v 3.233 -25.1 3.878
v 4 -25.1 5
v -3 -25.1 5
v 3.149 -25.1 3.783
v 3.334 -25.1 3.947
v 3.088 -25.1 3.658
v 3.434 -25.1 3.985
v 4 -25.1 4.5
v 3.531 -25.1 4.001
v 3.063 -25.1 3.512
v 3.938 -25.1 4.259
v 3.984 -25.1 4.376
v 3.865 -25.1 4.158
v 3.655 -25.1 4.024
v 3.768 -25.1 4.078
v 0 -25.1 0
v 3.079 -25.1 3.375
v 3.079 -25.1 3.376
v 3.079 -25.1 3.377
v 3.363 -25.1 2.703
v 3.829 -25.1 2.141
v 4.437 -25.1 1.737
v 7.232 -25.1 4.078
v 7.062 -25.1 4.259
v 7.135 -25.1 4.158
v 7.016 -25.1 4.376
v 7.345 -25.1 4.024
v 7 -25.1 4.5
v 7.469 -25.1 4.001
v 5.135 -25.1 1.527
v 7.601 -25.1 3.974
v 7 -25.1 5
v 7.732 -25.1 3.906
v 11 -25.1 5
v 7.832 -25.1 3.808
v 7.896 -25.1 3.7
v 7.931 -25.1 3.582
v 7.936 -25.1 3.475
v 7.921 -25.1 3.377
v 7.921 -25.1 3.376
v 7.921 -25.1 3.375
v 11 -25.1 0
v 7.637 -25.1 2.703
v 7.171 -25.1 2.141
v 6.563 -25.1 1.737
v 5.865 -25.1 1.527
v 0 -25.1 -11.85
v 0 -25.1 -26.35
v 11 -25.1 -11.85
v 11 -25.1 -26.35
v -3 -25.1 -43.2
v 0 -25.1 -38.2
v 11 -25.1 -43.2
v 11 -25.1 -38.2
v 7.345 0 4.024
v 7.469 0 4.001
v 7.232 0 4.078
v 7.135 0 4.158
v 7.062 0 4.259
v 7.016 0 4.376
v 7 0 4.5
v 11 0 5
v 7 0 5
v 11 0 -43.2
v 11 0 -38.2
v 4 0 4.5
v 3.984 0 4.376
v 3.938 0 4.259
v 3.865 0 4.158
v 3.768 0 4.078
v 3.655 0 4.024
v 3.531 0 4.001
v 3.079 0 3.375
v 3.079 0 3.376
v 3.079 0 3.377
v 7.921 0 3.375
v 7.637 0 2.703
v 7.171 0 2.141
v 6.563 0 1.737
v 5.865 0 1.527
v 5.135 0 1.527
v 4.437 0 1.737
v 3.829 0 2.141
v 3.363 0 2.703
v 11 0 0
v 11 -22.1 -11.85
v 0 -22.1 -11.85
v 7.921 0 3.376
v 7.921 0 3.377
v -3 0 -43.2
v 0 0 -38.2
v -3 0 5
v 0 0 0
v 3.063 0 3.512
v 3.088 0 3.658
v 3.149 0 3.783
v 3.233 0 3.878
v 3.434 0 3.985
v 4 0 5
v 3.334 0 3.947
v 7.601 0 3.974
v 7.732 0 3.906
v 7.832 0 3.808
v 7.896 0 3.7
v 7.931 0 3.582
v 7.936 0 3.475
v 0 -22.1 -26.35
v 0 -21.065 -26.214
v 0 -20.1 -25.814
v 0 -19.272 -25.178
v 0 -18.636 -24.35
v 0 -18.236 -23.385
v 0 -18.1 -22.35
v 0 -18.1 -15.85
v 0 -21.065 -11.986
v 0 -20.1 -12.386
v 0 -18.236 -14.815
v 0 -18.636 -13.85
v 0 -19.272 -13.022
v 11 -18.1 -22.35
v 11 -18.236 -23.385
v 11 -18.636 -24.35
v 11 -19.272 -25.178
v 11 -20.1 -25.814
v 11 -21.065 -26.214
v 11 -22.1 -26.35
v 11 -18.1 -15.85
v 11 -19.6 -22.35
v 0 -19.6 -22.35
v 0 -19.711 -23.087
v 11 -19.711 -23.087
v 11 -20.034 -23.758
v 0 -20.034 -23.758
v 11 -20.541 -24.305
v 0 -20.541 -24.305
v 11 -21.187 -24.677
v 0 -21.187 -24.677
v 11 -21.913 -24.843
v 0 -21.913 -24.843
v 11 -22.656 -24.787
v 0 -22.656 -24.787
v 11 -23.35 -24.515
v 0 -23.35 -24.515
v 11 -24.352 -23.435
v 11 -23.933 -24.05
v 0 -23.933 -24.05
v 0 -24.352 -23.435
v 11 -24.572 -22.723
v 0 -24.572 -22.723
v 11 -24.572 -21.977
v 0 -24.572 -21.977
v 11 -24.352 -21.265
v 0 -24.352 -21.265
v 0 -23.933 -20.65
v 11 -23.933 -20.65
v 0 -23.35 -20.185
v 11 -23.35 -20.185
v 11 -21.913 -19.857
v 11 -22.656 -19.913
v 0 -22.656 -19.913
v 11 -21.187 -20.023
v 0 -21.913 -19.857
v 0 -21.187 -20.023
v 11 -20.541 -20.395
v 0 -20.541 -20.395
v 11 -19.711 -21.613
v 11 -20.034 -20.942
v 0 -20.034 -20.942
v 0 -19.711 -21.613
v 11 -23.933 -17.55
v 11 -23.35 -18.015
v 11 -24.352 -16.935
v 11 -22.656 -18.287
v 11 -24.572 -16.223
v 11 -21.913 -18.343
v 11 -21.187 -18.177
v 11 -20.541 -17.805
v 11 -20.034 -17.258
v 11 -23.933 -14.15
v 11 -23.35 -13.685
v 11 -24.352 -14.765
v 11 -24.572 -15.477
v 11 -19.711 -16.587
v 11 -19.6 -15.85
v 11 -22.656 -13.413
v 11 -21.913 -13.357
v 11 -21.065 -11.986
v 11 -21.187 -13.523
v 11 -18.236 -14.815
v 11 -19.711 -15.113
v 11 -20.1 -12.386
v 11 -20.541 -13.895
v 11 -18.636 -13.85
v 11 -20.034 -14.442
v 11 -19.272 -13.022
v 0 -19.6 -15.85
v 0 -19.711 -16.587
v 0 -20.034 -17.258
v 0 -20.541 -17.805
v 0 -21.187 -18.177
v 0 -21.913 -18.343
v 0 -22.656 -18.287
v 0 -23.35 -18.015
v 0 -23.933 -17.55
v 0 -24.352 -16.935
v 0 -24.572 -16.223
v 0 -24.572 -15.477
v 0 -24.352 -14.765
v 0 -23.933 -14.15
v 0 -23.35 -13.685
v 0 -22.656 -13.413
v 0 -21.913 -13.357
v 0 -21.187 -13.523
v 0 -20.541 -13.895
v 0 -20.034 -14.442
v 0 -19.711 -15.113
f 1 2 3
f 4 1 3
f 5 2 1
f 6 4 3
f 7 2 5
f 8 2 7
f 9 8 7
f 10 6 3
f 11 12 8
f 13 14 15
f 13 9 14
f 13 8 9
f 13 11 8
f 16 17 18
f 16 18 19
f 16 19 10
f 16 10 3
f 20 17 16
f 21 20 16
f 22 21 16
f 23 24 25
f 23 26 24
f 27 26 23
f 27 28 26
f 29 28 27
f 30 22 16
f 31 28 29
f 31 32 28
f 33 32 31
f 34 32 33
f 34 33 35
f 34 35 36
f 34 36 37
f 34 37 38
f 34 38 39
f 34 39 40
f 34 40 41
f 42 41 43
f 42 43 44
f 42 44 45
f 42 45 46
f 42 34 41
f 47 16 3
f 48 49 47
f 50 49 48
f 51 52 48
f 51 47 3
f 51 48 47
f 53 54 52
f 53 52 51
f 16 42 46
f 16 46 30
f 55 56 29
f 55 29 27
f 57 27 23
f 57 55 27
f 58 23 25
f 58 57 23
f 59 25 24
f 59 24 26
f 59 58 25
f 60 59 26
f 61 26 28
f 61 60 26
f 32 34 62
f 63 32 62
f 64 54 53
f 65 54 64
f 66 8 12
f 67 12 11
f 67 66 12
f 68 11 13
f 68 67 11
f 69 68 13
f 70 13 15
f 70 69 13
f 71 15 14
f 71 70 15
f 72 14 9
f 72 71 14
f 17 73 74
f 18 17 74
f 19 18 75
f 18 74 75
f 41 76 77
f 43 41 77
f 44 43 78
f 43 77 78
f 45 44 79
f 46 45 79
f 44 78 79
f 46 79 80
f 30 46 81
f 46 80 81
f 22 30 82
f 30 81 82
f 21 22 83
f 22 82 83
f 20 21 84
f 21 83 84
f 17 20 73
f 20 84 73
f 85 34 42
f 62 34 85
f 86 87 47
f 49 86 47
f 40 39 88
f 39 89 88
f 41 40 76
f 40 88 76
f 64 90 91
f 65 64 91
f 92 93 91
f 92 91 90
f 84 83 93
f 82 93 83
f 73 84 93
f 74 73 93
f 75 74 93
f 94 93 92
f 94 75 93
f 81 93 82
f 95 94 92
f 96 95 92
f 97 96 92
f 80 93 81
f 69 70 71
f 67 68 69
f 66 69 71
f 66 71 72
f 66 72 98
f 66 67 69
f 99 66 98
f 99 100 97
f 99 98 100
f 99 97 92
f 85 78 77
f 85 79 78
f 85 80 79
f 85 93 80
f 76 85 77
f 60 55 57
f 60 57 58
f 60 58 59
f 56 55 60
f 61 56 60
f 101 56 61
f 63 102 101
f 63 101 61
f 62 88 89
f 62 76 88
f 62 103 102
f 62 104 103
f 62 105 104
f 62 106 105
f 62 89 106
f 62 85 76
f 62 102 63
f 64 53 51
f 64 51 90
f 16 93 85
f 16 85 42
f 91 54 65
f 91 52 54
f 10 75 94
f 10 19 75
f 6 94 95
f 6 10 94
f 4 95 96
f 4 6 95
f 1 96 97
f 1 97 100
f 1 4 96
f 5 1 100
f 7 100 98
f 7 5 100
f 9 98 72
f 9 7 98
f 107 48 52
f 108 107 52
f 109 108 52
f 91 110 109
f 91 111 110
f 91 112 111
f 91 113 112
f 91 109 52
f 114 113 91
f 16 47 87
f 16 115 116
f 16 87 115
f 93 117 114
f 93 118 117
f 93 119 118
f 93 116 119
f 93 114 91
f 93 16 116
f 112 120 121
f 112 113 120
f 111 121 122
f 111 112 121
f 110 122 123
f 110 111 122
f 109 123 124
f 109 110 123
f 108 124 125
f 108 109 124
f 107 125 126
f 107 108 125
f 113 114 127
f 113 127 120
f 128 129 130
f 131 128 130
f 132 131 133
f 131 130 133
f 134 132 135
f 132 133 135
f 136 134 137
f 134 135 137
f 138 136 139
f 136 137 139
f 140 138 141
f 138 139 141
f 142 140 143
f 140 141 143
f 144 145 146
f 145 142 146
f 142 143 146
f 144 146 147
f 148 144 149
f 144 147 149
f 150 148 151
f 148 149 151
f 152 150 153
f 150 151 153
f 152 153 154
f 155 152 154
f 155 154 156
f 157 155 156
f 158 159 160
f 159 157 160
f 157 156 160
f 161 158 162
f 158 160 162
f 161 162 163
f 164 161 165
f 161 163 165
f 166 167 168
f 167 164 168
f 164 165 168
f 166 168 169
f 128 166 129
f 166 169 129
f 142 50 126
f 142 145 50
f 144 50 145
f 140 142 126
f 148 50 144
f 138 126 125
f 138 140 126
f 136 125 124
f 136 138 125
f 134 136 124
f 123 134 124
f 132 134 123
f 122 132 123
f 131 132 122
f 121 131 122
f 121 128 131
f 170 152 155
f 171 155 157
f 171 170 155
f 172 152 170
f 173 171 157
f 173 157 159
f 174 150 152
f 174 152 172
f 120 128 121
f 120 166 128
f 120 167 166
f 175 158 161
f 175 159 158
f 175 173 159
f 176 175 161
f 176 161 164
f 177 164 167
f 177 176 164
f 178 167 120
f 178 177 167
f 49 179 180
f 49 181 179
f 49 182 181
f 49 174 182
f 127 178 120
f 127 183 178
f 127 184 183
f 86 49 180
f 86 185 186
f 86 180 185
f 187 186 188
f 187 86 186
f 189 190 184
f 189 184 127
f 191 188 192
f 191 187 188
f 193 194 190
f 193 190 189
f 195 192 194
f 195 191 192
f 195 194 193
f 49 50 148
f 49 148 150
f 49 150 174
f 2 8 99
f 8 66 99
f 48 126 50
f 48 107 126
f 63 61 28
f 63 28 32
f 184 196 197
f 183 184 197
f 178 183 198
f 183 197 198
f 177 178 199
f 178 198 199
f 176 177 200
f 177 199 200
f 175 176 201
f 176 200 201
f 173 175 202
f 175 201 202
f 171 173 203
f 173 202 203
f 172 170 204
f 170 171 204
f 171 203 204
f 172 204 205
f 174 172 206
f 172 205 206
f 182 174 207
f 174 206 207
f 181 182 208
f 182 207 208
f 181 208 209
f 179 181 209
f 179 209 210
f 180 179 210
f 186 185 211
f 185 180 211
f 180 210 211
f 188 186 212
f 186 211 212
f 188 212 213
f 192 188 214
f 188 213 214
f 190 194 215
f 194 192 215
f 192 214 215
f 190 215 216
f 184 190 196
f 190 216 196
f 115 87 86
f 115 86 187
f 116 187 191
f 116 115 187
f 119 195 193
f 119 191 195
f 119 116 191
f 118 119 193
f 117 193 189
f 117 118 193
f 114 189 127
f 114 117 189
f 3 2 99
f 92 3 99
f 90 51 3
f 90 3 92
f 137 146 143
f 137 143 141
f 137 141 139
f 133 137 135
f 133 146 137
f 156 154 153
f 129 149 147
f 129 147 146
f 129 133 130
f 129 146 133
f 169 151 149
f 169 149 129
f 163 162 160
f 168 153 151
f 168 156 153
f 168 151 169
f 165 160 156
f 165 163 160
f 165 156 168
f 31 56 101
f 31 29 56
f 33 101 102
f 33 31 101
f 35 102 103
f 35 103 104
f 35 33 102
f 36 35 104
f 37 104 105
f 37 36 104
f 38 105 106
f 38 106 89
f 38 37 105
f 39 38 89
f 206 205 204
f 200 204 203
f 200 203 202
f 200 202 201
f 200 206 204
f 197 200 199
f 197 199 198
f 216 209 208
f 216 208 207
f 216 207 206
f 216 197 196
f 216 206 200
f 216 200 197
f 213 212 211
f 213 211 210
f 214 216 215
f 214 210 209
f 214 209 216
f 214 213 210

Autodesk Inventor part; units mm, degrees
ref_plane "YZ Plane" through (0, 0, 0) normal (1, 0, 0) x (0, 1, 0)
ref_plane "XZ Plane" through (0, 0, 0) normal (0, 1, 0) x (-1, 0, 0)
sketch "Sketch1" plane through (0, 0, 0) normal (1, 0, 0) x (0, 1, 0)
  line L0 (0, 0) -> (-25.1, 0)
  line L1 (-25.1, 0) -> (-25.1, -38.2)
  line L2 (-25.1, -38.2) -> (0, -38.2)
  line L3 (0, -38.2) -> (0, 0)
  circle A0 centre (-22.1, -15.85) radius 2.5
  circle A1 centre (-22.1, -22.35) radius 2.5
  arc A2 (-18.1, -15.85) -> (-25.1, -18.4958) centre (-22.1, -15.85) ccw
  arc A3 (-25.1, -19.7042) -> (-18.1, -22.35) centre (-22.1, -22.35) ccw
  line L4 (-18.1, -15.85) -> (-18.1, -22.35)
  line L5 (-22.1, -11.85) -> (-25.1, -11.85)
  line L6 (-22.1, -26.35) -> (-25.1, -26.35)
  line L7 (0, 0) -> (-25.1, 0)
  line L8 (-25.1, 0) -> (-25.1, 5)
  line L9 (-25.1, 5) -> (0, 5)
  line L10 (0, 5) -> (0, 0)
  line L11 (0, -38.2) -> (-25.1, -38.2)
  line L12 (-25.1, -38.2) -> (-25.1, -43.2)
  line L13 (-25.1, -43.2) -> (0, -43.2)
  line L14 (0, -43.2) -> (0, -38.2)
  point P0 (-25.1, -19.1)
  point P1 (-25.1, -13.2042)
  point P2 (-25.1, -24.9958)
  dimension "d0" = 38.2
  dimension "d1" = 25.1
  dimension "d2" = 5
  dimension "d3" = 6.5
  dimension "d4" = 3
  dimension "d5" = 3.25
  dimension "d6" = 8
  dimension "d11" = 5
  dimension "d12" = 5
extrude "Extrusion1" add sketch "Sketch1" against normal blind 3 contours L3 L2 L1 L6 A3 L4 A2 L5 L0 | L0 L8 L9 L10 | L14 L13 L12 L2 | L5 A2 L1 | A2 L4 A3 L1 | L1 A3 L6 | A0 | A1
extrude "Extrusion2" add sketch "Sketch1" along normal blind 11 contours L0 L8 L9 L10 | L14 L13 L12 L2 | L5 A2 L1 | A2 L4 A3 L1 | L1 A3 L6
sketch "Sketch2" plane through (-3, -25.1, 5) normal (0, 0, 1) x (1, 0, 0)
  circle A0 centre (7, 20.1) radius 2.6
  line L0 (0, 25.1) -> (14, 25.1) projected
  circle A1 centre (7, 8.1) radius 2.6
  point P0 (3, 25.1)
  point P1 (7, 25.1)
  dimension "d13" = 5.2
  dimension "d14" = 5
  dimension "d15" = 12
extrude "Extrusion3" [suppressed]
ref_plane "Work Plane1" through (-3, -25.1, -19.1) normal (0, 0, 1) x (1, 0, 0)
sketch "Sketch3" plane through (-3, 0, 5) normal (0, 1, 0) x (1, 0, 0)
  line L0 (14, 48.2) -> (0, 48.2) projected
  line L1 (0, 0) -> (0, 48.2) projected
  line L2 (0, 0) -> (14, 0) projected
  line L3 (14, 5) -> (14, 0) projected
  line L4 (3, 5) -> (14, 5) projected
  line L5 (3, 43.2) -> (3, 5) projected
  line L6 (3, 43.2) -> (14, 43.2) projected
  line L7 (14, 48.2) -> (14, 43.2) projected
  arc A0 (10.9206, 1.625) -> (6.0794, 1.625) centre (8.5, 1) ccw
  line L8 (10, 0.5) -> (10, 0)
  line L9 (7, 0.5) -> (7, 0)
  arc A1 (7, 0.5) -> (6.5, 1) centre (6.5, 0.5) ccw
  arc A2 (10.5, 1) -> (10, 0.5) centre (10.5, 0.5) ccw
  line L10 (6.5, 1) -> (6, 1)
  arc A3 (11, 1) -> (6, 1) centre (8.5, 1) ccw
  line L11 (10.5, 1) -> (11, 1)
  point P0 (8.5, 5)
  point P1 (7, 1)
  point P2 (10, 1)
  point P3 (10.9206, 1.625)
  point P4 (6.0794, 1.625)
  dimension "d23" = 5
  dimension "d26" = 1.5
  dimension "d28" = 1.5
  dimension "d31" = 0.5
extrude "Extrusion4" cut sketch "Sketch3" against normal through all contours L9 A1 L10 A3 A0 L11 A2 L8 L2
fillet "Fillet1" radius 0.5 2 edges at (3, -12.55, 4) (8, -12.55, 4)
properties part number "Pixy2 cover"
